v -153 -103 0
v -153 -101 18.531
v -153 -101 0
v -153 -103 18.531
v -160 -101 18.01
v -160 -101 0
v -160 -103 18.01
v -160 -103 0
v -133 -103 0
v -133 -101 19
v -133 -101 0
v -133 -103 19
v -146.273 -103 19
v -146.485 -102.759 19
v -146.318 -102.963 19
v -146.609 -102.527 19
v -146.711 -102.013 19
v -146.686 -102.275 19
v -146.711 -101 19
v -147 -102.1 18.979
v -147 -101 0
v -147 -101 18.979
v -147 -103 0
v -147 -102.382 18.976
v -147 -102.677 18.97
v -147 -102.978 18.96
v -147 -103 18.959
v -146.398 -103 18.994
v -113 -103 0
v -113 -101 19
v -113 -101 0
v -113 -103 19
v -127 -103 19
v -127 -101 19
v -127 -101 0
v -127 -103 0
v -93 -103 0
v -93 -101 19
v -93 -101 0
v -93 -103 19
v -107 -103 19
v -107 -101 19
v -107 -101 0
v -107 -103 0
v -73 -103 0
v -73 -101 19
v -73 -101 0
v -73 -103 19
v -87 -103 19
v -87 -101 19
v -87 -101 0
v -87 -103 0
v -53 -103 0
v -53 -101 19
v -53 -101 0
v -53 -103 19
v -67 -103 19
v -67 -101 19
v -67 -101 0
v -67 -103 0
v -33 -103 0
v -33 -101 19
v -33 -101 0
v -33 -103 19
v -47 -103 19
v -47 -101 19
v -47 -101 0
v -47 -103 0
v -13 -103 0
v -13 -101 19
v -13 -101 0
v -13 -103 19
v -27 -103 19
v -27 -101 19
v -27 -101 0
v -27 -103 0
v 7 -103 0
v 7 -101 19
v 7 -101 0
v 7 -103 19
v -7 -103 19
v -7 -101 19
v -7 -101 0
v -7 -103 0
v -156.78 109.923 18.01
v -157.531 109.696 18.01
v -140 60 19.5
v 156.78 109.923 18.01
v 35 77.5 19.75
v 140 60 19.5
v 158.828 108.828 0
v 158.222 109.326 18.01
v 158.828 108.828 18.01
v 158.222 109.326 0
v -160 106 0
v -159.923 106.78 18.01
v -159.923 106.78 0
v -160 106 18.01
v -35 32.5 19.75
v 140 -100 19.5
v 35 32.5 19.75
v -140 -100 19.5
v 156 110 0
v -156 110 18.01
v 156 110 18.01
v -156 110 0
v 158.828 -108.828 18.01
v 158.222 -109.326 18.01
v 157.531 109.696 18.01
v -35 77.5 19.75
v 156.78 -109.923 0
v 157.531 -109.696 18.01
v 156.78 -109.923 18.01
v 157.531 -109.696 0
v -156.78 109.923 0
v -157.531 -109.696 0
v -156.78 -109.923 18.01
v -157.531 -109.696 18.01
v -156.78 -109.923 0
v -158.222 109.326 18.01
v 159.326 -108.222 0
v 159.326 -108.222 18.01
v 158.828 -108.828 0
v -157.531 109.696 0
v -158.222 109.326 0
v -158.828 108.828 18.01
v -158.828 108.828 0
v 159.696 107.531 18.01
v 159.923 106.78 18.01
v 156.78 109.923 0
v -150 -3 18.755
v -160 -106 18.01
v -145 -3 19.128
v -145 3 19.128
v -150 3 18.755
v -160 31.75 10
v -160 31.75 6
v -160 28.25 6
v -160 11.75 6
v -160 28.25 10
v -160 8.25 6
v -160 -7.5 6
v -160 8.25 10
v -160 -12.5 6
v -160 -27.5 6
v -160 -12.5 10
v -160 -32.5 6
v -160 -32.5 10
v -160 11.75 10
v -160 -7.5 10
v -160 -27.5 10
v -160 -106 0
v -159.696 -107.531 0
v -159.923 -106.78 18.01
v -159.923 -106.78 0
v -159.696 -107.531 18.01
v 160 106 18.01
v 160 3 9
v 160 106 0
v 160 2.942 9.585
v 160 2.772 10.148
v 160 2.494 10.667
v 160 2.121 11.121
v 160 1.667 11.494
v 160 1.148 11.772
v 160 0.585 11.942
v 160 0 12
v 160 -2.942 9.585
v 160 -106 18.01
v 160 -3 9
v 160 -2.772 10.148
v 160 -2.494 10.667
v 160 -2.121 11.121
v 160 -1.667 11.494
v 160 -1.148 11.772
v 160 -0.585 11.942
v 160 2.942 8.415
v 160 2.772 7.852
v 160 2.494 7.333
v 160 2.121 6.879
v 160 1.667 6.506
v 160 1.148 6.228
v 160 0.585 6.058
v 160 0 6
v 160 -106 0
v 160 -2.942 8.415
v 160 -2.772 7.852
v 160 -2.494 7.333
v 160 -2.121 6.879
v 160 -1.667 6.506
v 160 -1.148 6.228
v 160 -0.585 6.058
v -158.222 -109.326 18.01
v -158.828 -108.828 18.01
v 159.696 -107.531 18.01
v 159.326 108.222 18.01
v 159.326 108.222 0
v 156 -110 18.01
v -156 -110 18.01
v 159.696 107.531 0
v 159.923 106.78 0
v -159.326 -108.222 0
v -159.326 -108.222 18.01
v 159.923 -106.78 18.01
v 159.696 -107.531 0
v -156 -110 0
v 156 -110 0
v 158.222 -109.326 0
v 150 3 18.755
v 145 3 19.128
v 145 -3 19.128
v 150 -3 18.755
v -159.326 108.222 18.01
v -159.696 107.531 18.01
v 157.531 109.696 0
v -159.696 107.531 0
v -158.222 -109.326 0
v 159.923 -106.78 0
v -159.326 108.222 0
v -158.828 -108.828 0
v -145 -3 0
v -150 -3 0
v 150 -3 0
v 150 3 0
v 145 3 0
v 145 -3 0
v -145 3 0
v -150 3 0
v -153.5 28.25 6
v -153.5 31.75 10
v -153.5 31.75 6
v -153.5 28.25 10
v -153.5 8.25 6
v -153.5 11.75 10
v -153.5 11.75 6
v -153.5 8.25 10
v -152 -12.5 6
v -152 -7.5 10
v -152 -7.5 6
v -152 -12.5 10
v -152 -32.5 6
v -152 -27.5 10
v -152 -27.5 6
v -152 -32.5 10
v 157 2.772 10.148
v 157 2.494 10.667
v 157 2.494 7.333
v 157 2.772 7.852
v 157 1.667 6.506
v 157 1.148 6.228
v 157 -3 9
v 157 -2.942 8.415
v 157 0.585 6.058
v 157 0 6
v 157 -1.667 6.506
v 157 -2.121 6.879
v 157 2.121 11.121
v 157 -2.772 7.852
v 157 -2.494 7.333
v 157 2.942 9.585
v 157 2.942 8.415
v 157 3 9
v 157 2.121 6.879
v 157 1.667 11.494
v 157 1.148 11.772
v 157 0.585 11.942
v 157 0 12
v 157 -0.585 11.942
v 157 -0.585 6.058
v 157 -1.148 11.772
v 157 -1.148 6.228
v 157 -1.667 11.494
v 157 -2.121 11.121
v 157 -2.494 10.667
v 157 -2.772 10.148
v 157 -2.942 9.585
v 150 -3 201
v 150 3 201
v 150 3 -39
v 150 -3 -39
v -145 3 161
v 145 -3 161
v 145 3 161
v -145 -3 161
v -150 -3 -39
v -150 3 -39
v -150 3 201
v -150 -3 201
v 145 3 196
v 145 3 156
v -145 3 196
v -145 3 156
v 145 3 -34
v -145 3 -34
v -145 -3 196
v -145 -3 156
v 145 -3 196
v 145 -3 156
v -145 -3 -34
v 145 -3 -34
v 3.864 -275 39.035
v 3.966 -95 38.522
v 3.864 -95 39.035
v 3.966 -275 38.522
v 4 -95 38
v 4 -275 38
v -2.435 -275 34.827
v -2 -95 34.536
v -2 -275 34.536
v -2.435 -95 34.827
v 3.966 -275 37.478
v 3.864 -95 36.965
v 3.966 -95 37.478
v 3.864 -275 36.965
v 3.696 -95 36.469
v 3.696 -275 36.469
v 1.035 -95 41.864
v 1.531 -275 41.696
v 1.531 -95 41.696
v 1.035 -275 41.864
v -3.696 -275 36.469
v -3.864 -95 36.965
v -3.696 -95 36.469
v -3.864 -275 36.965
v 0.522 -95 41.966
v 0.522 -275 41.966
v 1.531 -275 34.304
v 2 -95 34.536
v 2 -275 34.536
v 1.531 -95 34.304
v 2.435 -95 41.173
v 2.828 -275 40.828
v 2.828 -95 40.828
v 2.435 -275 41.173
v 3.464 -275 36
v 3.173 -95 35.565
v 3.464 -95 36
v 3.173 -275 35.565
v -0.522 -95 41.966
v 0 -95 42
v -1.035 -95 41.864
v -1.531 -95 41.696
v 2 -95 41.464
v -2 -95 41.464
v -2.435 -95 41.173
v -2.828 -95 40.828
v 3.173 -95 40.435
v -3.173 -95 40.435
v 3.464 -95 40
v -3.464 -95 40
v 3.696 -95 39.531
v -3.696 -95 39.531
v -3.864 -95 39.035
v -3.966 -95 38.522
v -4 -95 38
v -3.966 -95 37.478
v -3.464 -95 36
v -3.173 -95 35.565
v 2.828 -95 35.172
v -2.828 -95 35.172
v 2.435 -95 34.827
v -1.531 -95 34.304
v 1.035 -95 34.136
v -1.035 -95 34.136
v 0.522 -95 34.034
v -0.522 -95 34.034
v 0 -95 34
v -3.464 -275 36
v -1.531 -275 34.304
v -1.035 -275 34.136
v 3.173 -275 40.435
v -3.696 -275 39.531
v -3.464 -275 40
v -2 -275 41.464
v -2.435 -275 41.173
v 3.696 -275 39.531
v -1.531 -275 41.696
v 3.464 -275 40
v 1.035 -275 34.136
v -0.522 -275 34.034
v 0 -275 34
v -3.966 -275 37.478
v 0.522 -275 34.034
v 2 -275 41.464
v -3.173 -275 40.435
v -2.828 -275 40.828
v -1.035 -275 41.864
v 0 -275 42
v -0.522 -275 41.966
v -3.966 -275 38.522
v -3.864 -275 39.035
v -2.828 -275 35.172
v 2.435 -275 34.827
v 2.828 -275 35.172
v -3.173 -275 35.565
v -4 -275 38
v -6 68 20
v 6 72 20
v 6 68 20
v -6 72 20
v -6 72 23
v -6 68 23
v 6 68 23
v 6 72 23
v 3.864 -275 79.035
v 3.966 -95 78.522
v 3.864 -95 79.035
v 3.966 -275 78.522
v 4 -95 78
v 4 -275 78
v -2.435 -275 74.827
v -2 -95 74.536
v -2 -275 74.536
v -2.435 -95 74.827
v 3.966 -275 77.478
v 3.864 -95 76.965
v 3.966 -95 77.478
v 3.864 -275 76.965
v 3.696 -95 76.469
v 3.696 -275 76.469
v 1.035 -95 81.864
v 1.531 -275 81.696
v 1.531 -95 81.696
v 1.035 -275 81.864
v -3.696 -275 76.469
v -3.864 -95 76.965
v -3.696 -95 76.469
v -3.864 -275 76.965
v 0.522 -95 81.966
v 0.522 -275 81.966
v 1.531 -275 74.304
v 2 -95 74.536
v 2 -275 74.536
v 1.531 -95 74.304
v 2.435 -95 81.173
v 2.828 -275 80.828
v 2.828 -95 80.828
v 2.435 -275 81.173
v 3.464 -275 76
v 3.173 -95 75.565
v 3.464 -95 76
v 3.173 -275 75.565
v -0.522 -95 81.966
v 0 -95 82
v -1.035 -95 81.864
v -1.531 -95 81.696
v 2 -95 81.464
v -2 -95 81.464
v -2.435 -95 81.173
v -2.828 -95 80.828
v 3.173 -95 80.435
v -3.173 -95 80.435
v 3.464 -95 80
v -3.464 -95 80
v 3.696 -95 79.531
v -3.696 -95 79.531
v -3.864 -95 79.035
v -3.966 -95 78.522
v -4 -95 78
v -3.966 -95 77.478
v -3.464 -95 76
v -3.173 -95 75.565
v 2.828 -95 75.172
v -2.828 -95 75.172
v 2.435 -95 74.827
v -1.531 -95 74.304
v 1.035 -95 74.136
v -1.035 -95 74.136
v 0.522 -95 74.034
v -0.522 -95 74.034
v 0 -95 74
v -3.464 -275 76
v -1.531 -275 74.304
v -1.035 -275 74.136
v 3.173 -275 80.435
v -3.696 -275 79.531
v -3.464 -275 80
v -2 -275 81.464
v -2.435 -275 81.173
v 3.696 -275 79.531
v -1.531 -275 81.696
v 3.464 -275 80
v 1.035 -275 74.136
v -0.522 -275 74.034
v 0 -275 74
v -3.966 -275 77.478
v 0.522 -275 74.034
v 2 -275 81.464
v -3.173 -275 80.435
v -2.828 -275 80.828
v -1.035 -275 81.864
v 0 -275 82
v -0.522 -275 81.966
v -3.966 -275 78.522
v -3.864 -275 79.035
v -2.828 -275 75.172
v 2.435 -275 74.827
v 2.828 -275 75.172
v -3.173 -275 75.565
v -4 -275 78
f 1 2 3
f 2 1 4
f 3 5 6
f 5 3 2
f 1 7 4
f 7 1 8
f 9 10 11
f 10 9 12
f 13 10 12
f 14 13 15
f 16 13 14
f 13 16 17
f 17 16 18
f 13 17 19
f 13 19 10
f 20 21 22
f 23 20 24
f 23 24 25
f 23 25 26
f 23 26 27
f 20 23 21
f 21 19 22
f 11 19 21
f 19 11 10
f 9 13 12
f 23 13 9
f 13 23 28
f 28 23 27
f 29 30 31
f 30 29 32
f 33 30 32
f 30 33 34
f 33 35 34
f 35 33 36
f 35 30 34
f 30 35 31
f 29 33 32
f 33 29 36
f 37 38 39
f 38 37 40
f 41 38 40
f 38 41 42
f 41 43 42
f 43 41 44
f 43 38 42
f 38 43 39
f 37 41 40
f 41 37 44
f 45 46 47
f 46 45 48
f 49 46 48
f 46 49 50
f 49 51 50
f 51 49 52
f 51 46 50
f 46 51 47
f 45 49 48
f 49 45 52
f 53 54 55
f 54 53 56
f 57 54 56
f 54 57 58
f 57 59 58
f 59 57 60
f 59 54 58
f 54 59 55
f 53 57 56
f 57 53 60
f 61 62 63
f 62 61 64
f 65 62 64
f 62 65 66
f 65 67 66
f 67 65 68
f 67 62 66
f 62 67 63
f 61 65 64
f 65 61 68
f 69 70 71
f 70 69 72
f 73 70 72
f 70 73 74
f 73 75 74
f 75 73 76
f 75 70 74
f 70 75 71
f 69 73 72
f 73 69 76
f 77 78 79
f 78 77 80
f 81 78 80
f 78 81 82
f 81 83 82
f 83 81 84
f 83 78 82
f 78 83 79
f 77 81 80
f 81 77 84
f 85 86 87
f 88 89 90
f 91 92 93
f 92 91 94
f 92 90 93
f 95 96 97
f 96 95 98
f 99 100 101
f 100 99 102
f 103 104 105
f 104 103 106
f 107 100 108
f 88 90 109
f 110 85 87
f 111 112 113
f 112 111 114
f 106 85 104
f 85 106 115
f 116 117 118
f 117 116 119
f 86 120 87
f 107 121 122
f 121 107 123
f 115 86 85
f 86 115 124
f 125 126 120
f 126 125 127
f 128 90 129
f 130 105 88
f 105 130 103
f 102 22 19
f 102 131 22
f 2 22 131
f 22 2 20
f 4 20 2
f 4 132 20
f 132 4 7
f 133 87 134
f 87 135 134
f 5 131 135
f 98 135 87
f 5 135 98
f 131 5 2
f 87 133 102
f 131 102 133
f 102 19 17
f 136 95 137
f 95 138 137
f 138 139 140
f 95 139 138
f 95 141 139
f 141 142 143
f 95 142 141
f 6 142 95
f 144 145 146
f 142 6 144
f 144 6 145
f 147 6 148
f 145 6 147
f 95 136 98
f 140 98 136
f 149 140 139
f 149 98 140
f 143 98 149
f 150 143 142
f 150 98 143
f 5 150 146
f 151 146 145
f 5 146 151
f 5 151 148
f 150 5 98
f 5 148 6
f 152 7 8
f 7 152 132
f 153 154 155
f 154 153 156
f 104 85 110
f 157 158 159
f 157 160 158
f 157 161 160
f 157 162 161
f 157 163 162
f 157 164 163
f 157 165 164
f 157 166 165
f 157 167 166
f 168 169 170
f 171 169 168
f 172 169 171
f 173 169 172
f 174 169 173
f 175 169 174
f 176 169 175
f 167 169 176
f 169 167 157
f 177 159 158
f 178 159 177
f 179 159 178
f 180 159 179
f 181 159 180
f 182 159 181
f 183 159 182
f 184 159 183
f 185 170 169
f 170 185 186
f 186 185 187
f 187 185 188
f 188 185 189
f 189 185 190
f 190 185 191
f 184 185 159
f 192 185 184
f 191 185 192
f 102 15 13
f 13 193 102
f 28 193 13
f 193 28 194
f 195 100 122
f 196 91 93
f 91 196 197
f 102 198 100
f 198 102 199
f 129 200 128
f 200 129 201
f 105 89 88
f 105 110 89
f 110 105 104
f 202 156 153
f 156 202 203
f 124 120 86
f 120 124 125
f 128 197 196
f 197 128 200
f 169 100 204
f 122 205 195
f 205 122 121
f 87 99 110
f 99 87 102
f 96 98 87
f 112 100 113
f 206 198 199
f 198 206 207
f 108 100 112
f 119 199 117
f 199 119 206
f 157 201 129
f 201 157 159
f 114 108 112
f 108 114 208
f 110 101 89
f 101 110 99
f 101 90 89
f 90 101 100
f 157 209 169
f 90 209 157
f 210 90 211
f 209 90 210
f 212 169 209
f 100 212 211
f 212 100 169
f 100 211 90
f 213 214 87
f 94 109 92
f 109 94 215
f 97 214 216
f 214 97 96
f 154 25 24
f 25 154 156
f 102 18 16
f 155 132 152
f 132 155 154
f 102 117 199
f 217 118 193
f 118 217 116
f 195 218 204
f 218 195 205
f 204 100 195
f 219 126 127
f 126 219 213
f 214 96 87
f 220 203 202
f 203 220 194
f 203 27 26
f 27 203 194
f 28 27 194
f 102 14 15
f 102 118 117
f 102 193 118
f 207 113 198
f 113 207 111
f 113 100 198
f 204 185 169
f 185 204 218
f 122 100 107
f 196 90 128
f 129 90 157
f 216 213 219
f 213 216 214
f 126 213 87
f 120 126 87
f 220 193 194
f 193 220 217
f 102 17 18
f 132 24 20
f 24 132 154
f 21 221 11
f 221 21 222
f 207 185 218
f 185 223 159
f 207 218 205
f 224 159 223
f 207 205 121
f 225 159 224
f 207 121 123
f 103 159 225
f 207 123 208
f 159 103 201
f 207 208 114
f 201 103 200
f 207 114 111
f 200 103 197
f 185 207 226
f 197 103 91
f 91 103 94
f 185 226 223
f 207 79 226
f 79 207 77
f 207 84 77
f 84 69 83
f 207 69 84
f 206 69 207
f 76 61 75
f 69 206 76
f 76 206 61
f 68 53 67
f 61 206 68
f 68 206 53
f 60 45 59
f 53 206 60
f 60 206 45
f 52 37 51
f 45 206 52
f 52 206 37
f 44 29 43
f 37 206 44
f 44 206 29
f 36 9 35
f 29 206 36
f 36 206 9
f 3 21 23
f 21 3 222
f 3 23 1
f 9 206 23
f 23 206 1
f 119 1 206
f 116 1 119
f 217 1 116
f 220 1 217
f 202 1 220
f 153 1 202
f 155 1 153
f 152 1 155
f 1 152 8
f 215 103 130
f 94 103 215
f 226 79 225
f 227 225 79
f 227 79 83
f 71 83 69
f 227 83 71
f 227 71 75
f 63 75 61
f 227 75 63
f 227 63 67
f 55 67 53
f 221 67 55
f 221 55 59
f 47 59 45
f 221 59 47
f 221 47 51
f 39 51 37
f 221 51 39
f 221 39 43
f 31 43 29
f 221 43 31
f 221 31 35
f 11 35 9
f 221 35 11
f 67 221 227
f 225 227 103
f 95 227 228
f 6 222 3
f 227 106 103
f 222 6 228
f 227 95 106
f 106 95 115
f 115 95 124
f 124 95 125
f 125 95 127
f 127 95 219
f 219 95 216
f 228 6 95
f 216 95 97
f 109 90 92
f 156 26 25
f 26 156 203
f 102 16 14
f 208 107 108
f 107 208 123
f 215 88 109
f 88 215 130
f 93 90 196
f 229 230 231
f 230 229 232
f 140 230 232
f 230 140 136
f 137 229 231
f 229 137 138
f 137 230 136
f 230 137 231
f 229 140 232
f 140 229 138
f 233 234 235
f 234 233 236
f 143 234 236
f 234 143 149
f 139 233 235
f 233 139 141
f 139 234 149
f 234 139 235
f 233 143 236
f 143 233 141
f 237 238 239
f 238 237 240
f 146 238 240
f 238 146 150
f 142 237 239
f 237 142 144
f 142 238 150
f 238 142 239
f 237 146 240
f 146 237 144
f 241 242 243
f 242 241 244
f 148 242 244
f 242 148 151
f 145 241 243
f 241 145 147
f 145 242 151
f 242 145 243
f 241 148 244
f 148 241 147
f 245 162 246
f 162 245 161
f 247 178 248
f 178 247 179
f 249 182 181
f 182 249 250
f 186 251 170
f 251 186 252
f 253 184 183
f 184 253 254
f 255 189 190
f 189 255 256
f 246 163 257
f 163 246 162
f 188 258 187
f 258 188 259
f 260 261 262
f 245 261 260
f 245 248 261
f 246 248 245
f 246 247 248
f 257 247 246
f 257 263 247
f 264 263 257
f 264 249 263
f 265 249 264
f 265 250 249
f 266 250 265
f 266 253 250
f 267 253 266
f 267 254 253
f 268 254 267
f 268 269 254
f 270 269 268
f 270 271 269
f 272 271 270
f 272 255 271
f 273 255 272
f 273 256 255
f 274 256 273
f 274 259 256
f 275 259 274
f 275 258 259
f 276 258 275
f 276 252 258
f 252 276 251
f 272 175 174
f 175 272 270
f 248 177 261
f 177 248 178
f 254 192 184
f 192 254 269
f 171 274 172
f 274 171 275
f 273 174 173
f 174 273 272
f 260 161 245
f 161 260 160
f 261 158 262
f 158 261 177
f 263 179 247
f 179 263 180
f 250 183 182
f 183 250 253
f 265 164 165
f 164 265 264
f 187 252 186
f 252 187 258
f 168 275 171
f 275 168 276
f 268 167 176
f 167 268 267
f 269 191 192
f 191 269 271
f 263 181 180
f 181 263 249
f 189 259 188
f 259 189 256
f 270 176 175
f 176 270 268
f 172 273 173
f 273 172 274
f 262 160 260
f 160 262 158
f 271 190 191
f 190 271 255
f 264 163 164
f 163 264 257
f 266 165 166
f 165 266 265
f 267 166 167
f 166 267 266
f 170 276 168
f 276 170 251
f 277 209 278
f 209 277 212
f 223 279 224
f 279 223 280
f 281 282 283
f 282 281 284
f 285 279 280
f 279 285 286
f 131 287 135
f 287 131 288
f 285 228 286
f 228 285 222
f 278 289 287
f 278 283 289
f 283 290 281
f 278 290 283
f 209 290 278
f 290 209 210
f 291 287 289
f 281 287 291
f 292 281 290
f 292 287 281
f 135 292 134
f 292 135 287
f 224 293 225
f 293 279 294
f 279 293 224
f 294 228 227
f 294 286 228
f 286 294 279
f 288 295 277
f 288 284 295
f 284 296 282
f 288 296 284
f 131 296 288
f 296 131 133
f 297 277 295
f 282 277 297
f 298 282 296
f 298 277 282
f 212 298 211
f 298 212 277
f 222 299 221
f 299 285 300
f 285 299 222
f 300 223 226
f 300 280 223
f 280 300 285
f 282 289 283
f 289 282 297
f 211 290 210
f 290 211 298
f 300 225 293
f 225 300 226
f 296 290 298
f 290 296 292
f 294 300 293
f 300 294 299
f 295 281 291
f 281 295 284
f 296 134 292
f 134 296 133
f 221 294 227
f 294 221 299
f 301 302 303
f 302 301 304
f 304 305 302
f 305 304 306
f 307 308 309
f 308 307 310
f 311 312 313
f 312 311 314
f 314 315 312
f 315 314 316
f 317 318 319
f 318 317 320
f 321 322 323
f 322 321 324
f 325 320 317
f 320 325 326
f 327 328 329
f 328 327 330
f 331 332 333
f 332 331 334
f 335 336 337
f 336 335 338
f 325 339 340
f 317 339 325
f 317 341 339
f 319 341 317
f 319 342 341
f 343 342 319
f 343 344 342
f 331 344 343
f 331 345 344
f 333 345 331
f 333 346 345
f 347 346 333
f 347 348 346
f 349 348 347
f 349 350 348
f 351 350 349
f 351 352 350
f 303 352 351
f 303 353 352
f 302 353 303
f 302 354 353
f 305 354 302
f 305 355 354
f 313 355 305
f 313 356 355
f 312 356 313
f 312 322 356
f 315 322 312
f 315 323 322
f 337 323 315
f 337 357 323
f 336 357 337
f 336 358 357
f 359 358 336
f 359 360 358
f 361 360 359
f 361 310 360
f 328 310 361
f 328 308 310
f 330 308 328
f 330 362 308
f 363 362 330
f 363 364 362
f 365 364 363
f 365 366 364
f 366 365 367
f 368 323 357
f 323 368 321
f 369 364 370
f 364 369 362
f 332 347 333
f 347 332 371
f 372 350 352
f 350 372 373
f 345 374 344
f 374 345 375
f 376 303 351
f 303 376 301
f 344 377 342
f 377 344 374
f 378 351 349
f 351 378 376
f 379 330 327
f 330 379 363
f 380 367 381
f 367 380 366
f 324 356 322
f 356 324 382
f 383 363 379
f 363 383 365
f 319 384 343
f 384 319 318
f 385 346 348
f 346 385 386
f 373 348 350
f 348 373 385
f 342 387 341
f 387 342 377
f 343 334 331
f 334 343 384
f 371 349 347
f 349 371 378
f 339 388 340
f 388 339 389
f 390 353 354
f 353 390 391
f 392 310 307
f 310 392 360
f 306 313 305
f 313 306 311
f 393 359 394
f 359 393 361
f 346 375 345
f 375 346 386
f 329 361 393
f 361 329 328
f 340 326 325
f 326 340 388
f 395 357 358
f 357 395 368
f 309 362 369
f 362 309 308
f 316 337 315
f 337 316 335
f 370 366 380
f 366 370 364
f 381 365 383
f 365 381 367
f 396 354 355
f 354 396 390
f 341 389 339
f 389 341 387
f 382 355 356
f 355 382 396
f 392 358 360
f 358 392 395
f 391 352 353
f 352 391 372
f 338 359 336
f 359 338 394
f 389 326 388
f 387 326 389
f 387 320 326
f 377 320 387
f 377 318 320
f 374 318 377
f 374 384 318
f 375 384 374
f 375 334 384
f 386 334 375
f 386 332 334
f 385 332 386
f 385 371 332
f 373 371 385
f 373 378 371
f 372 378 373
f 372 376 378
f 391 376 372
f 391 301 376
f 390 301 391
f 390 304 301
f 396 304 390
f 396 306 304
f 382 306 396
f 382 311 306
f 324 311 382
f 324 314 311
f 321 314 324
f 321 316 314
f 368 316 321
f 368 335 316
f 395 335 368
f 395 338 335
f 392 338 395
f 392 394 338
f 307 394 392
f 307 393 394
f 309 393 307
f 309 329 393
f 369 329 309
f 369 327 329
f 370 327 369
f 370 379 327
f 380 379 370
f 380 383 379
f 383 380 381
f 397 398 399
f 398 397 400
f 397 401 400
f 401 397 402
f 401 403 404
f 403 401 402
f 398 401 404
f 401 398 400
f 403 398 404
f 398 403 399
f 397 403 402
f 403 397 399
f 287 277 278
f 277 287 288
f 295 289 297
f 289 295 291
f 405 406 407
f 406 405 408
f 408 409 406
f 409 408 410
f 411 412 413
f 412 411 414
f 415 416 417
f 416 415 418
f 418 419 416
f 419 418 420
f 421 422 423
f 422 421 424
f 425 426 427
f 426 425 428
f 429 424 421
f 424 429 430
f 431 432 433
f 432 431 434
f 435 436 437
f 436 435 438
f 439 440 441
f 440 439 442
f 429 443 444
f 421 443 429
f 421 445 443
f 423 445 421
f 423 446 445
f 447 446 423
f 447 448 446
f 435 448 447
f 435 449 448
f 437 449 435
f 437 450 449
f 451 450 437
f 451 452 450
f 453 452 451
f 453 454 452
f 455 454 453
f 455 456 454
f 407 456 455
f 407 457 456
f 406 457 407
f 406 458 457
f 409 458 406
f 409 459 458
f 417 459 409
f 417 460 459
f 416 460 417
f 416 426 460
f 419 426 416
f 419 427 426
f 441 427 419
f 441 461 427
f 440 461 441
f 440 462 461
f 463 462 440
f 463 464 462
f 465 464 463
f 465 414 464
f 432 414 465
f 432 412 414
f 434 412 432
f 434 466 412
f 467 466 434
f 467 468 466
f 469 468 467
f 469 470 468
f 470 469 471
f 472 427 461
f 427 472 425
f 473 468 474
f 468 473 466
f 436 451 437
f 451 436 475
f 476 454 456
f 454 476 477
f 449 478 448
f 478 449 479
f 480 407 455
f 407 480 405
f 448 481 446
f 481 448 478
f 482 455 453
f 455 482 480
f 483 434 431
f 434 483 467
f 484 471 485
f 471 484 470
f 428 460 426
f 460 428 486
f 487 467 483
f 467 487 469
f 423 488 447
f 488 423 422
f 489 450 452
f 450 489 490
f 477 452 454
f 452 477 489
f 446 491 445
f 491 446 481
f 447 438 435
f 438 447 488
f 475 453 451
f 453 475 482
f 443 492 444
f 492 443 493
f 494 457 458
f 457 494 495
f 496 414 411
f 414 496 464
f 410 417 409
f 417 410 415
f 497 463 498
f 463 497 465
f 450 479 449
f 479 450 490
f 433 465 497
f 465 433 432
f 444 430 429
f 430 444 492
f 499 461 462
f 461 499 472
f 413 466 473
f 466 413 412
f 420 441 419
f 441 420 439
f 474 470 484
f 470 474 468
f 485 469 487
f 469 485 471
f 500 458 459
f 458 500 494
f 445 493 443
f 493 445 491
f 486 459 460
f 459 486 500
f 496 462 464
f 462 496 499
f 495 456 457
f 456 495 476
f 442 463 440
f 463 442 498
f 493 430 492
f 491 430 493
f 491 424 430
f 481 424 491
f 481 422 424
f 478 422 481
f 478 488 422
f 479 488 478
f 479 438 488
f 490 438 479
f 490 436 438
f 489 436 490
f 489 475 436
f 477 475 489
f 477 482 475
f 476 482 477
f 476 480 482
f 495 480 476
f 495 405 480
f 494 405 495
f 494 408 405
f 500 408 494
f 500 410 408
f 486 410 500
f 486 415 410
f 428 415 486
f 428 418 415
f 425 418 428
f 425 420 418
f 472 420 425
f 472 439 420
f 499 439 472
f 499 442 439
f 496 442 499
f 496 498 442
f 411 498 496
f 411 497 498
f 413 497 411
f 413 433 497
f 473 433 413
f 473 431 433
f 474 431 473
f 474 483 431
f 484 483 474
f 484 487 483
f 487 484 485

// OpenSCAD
// file: ../common/branding.scad
module gunnch_badge() {
  linear_extrude(badge_h) translate([0,0,0]) square([badge_w, badge_w/3], center=true);
}
// file: ../common/ports.scad
module usb_c_cutout() {
  translate([0,0,-1]) cube([9, 3.5, wall+2], center=true);
}
module usb_a_cutout() {
  translate([0,0,-1]) cube([12, 5, wall+2], center=true);
}
module audio_3_5_cutout() {
  translate([0,0,-1]) cylinder(h=wall+2, d=6, $fn=32);
}
// file: ../common/dimensions.scad
// Shared dimensions — EVT-0 concept only
wall = 2;
corner_r = 4;
badge_w = 12;
badge_h = 3;
// file: student_14_5_concept.scad
include <../common/dimensions.scad>
include <../common/ports.scad>
include <../common/branding.scad>

base_l=320; base_w=220; base_h=18;
screen_l=300; screen_w=200; screen_t=6;

module student_base() {
  difference() {
    hull() {
      translate([0,0,base_h/2]) minkowski() {
        cube([base_l-2*corner_r, base_w-2*corner_r, base_h], center=true);
        cylinder(r=corner_r, h=0.01, $fn=32);
      }
      // keyboard deck
      translate([0,-20,base_h]) cube([base_l-40, base_w-60, 3], center=true);
      // trackpad
      translate([0,55,base_h+1]) cube([70,45,1.5], center=true);
    }
    // vent slots
    for (i=[-4:4]) translate([-80+i*20, -base_w/2+8, base_h/2]) cube([14, 2, base_h+2], center=true);
    // ports left
    translate([-base_l/2+2, 30, base_h/2]) usb_c_cutout();
    translate([-base_l/2+2, 10, base_h/2]) usb_c_cutout();
    translate([-base_l/2+2, -10, base_h/2]) usb_a_cutout();
    translate([-base_l/2+2, -30, base_h/2]) usb_a_cutout();
    translate([base_l/2-2, 0, base_h/2]) rotate([0,90,0]) audio_3_5_cutout();
  }
}

module student_screen() {
  difference() {
    translate([0,-base_w/2+screen_w/2+10, base_h+screen_t/2+40]) cube([screen_l, screen_t, screen_w], center=true);
    translate([0,-base_w/2+screen_w/2+10, base_h+screen_t/2+40]) cube([screen_l-10, screen_t+2, screen_w-10], center=true);
  }
  // hinge
  translate([0,-base_w/2+15, base_h+20]) rotate([90,0,0]) cylinder(h=screen_w-20, r=4, $fn=48);
}

union() {
  student_base();
  student_screen();
  translate([0,70,base_h+2]) gunnch_badge();
}
// main file
// Exploded view — Student 14.5" EVT-0 (conceptual)
include <student_14_5_concept.scad>
translate([0, 0, 40]) student_screen();
translate([0, 0, 0]) student_base();
